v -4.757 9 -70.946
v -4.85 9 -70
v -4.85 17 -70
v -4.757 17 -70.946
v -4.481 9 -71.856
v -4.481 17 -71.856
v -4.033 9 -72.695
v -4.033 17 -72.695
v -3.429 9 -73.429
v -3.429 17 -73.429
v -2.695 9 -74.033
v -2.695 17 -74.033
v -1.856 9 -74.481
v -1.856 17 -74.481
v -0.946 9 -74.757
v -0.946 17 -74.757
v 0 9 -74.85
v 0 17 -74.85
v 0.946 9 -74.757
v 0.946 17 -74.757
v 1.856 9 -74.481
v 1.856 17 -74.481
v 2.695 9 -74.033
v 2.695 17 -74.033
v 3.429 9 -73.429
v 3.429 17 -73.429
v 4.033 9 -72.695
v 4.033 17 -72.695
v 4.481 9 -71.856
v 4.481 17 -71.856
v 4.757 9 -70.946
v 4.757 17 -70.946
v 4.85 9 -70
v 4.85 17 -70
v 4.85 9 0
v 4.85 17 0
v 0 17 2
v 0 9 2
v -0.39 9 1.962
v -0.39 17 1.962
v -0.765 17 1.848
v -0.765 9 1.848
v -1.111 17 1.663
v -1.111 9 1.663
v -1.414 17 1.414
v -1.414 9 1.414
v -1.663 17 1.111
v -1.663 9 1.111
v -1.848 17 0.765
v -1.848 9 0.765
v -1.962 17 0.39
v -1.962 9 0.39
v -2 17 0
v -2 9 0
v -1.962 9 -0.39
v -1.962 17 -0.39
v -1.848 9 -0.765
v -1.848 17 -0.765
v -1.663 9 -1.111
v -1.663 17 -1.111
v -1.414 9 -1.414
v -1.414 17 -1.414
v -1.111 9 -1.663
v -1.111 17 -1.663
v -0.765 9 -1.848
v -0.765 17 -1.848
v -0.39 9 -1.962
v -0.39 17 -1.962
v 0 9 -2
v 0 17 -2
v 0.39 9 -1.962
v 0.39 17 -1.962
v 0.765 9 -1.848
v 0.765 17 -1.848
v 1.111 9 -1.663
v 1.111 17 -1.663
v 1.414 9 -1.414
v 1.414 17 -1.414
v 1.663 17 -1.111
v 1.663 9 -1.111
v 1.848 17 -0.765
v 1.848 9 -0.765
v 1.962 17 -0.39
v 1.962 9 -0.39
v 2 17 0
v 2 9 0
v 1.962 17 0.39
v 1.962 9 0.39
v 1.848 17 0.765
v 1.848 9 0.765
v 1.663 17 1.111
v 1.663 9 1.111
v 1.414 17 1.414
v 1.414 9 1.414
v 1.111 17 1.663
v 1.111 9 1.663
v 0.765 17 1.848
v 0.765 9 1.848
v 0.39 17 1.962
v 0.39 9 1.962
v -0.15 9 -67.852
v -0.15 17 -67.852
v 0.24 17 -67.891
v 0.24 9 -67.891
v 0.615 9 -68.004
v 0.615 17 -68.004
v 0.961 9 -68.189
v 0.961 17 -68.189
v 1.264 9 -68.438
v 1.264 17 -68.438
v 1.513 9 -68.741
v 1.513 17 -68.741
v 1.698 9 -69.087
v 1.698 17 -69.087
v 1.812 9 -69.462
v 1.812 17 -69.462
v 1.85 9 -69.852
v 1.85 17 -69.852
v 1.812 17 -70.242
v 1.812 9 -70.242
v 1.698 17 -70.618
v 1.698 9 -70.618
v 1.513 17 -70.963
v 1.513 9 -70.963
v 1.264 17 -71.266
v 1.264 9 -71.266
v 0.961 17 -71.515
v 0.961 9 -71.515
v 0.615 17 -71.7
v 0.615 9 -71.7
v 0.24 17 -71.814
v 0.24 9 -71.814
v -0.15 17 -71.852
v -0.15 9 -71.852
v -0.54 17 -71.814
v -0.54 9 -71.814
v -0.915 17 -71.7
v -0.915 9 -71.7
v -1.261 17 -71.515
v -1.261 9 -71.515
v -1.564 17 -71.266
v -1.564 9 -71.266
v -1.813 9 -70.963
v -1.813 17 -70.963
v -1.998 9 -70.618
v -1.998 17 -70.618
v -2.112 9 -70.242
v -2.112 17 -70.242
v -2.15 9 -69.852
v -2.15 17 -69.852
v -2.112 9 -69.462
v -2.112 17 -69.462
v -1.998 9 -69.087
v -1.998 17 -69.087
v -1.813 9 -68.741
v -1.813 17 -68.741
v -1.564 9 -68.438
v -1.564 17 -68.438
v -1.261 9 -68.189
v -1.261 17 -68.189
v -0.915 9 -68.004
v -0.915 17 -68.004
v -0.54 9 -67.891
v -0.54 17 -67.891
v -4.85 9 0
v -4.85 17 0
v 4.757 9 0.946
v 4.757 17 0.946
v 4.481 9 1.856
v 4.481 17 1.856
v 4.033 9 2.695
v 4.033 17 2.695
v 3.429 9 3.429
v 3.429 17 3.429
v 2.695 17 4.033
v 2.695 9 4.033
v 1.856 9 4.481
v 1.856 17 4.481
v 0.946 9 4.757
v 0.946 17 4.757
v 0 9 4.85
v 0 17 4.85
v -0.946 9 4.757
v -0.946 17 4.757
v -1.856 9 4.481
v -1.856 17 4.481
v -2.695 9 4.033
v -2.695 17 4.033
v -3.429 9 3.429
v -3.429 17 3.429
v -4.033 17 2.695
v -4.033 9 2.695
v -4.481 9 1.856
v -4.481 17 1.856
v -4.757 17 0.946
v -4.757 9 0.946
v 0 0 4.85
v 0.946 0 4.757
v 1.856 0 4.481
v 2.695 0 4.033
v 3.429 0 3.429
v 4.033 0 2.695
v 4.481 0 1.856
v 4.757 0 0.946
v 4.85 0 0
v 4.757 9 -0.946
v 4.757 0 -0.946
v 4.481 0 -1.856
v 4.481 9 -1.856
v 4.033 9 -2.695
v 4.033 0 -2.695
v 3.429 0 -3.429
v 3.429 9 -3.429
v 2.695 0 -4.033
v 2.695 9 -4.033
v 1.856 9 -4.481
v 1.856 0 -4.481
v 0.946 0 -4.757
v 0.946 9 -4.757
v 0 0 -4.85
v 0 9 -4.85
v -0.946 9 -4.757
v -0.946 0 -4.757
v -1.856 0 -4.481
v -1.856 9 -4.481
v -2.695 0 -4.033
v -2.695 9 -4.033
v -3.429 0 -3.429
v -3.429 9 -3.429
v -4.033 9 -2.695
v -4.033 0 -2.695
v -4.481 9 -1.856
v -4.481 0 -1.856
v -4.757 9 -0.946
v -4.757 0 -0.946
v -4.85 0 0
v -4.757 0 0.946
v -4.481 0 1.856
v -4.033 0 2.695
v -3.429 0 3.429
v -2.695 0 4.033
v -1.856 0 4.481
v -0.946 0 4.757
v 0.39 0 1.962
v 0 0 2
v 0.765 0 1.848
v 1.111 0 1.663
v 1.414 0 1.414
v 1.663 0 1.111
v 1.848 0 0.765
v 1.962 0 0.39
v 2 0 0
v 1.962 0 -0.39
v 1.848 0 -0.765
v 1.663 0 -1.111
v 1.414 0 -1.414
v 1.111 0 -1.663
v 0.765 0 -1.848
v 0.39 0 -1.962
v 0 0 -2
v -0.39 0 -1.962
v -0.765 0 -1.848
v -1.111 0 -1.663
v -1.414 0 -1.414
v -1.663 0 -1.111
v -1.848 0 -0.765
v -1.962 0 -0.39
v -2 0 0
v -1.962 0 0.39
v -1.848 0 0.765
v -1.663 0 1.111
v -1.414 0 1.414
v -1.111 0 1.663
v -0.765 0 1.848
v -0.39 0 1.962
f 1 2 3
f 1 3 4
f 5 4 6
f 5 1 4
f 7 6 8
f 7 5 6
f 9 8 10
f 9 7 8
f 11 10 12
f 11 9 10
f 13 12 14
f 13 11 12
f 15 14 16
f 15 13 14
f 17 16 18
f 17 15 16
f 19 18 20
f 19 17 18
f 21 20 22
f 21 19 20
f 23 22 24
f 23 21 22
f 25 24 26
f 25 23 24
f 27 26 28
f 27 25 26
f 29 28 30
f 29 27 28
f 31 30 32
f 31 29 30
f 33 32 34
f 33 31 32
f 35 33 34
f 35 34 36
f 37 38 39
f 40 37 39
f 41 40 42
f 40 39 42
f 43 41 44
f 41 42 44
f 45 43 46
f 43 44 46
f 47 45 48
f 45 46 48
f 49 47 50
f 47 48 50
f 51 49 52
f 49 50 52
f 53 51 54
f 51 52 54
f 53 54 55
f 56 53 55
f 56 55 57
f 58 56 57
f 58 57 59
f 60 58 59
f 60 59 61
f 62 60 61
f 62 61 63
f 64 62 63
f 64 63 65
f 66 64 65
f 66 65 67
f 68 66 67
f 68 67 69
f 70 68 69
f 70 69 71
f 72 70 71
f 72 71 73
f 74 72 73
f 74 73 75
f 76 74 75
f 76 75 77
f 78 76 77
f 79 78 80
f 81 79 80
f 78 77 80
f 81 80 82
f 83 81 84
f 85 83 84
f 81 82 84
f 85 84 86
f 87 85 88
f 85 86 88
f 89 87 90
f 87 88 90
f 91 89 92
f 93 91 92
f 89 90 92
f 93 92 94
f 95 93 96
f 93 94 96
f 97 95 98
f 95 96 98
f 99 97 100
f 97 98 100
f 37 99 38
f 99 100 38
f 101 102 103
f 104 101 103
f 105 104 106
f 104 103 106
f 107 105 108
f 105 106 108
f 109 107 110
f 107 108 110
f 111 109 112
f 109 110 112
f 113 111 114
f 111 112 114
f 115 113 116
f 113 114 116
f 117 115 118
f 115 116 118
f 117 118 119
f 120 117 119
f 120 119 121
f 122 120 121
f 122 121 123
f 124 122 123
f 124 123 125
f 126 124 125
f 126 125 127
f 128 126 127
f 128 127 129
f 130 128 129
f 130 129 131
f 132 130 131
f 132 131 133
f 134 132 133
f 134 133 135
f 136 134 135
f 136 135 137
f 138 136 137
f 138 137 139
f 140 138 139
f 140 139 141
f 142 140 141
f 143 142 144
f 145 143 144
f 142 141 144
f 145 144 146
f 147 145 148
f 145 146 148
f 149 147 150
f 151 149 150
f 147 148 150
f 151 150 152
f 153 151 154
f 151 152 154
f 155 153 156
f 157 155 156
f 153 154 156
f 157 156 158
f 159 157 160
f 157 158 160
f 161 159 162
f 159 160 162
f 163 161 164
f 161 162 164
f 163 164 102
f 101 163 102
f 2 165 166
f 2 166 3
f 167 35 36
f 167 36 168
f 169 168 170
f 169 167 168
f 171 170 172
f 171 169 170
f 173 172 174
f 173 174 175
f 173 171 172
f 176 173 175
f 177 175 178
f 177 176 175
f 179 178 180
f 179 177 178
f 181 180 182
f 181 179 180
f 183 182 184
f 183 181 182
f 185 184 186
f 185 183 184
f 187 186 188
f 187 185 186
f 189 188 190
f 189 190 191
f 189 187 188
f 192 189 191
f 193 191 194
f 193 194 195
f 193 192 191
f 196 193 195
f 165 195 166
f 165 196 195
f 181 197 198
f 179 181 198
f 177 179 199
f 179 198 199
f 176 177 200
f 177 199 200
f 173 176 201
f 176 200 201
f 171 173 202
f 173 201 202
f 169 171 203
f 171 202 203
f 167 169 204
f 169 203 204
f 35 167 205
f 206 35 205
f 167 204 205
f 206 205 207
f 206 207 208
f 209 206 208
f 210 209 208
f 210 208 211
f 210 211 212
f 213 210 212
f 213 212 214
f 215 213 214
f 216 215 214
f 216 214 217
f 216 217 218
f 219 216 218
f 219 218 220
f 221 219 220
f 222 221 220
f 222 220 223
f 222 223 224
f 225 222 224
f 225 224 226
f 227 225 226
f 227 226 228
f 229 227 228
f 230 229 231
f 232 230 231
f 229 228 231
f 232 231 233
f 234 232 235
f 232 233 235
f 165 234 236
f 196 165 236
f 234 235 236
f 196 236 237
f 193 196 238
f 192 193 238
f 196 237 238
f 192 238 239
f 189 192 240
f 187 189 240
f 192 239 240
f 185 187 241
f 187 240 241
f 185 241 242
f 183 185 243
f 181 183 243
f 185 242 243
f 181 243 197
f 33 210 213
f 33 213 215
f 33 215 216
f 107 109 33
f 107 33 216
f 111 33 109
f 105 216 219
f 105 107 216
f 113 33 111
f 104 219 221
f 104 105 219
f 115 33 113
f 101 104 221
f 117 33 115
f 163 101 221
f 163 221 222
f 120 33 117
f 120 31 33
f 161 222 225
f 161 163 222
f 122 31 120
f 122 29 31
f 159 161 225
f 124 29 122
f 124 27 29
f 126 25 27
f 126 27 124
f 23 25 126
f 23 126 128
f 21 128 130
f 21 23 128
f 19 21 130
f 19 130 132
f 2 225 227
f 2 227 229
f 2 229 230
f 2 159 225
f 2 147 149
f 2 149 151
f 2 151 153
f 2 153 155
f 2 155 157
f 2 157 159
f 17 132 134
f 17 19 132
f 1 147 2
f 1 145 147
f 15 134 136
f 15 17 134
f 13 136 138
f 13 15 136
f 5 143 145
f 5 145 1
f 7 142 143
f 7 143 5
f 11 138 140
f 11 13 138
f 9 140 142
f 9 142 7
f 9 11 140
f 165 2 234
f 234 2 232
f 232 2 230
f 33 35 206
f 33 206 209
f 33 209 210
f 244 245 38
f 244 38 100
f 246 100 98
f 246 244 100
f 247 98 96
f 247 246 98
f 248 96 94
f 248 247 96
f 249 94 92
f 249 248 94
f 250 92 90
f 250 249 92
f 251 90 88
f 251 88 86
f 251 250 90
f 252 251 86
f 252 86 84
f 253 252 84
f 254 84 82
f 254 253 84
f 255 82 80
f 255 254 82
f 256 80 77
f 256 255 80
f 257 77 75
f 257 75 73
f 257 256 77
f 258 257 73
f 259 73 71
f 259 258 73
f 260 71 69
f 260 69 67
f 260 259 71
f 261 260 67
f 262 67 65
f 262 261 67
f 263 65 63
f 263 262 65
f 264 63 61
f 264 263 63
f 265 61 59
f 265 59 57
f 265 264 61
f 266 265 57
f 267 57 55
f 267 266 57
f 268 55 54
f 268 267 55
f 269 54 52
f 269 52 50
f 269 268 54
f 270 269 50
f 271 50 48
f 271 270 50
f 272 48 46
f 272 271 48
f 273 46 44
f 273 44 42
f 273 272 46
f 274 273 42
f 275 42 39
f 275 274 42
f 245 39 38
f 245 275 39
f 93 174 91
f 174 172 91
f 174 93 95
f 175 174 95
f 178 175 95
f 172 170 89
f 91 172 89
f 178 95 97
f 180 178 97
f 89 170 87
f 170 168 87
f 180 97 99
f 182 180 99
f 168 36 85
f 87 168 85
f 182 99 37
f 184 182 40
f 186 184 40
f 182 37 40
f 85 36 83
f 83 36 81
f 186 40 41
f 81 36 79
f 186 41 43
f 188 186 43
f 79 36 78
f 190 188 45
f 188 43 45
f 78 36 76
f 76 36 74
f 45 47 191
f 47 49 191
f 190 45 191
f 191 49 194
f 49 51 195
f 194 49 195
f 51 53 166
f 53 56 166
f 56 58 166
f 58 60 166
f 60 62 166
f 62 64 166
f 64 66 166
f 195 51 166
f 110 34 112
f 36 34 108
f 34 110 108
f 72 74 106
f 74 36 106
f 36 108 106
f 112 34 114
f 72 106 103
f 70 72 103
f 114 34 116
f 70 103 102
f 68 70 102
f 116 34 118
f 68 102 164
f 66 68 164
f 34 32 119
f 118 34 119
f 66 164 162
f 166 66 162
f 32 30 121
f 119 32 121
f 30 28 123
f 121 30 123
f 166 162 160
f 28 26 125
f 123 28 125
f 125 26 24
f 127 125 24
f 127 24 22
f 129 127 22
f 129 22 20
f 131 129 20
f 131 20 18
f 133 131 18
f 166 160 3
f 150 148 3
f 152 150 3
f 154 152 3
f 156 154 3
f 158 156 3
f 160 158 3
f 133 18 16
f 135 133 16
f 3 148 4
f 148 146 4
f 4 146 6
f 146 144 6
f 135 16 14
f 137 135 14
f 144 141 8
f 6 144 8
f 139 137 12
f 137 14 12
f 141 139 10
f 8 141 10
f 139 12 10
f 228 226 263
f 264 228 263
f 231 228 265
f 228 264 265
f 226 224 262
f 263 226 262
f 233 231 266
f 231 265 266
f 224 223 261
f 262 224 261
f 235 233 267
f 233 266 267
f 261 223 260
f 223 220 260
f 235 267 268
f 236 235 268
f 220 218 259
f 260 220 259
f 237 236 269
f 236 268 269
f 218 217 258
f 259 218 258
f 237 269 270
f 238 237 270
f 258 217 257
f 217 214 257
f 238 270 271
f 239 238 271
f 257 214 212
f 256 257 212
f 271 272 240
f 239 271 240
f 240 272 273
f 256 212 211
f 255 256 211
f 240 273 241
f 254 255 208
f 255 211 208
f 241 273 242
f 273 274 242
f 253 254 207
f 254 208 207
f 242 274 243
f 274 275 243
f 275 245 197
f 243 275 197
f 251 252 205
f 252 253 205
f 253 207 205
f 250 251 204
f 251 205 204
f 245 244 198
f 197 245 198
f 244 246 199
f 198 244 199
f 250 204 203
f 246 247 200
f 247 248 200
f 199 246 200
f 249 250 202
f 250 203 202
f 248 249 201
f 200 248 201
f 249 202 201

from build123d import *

# Parameters (mm, degrees)
SKETCH1_R           = 4.85
SKETCH1_R_2         = 2
BOSS_EXTRUDE1_DEPTH = 9
BOSS_EXTRUDE2_DEPTH = 8
SKETCH4_R           = 2
CUT_EXTRUDE1_DEPTH  = 10
SKETCH5_R           = 2
CUT_EXTRUDE2_DEPTH  = 10


with BuildPart() as part:
    # Sketch1 → Boss-Extrude1 (new body)
    with BuildSketch(Plane(origin=(0, 0, 0), x_dir=(1, 0, 0), z_dir=(0, 1, 0))):
        Circle(SKETCH1_R)
        Circle(SKETCH1_R_2, mode=Mode.SUBTRACT)
    extrude(amount=BOSS_EXTRUDE1_DEPTH)

    # Sketch2 → Boss-Extrude2 (add)
    with BuildSketch(Plane(origin=(0, 9, 0), x_dir=(1, 0, 0), z_dir=(0, 1, 0))):
        with BuildLine():
            Line((-4.85, 0), (-4.85, 70))
            ThreePointArc((-4.85, 70), (0, 74.85), (4.85, 70))
            Line((4.85, 70), (4.85, 0))
            ThreePointArc((4.85, 0), (0, -4.85), (-4.85, 0))
        make_face()
    extrude(amount=BOSS_EXTRUDE2_DEPTH)

    # Sketch4 → Cut-Extrude1 (cut)
    with BuildSketch(Plane.XZ.offset(-9)):
        Circle(SKETCH4_R)
    extrude(amount=-CUT_EXTRUDE1_DEPTH, mode=Mode.SUBTRACT)

    # Sketch5 → Cut-Extrude2 (cut)
    with BuildSketch(Plane(origin=(0, 17, 0), x_dir=(1, 0, 0), z_dir=(0, 1, 0))):
        with Locations((-0.15, 69.852250506)):
            Circle(SKETCH5_R)
    extrude(amount=-CUT_EXTRUDE2_DEPTH, mode=Mode.SUBTRACT)


solid = part.part
